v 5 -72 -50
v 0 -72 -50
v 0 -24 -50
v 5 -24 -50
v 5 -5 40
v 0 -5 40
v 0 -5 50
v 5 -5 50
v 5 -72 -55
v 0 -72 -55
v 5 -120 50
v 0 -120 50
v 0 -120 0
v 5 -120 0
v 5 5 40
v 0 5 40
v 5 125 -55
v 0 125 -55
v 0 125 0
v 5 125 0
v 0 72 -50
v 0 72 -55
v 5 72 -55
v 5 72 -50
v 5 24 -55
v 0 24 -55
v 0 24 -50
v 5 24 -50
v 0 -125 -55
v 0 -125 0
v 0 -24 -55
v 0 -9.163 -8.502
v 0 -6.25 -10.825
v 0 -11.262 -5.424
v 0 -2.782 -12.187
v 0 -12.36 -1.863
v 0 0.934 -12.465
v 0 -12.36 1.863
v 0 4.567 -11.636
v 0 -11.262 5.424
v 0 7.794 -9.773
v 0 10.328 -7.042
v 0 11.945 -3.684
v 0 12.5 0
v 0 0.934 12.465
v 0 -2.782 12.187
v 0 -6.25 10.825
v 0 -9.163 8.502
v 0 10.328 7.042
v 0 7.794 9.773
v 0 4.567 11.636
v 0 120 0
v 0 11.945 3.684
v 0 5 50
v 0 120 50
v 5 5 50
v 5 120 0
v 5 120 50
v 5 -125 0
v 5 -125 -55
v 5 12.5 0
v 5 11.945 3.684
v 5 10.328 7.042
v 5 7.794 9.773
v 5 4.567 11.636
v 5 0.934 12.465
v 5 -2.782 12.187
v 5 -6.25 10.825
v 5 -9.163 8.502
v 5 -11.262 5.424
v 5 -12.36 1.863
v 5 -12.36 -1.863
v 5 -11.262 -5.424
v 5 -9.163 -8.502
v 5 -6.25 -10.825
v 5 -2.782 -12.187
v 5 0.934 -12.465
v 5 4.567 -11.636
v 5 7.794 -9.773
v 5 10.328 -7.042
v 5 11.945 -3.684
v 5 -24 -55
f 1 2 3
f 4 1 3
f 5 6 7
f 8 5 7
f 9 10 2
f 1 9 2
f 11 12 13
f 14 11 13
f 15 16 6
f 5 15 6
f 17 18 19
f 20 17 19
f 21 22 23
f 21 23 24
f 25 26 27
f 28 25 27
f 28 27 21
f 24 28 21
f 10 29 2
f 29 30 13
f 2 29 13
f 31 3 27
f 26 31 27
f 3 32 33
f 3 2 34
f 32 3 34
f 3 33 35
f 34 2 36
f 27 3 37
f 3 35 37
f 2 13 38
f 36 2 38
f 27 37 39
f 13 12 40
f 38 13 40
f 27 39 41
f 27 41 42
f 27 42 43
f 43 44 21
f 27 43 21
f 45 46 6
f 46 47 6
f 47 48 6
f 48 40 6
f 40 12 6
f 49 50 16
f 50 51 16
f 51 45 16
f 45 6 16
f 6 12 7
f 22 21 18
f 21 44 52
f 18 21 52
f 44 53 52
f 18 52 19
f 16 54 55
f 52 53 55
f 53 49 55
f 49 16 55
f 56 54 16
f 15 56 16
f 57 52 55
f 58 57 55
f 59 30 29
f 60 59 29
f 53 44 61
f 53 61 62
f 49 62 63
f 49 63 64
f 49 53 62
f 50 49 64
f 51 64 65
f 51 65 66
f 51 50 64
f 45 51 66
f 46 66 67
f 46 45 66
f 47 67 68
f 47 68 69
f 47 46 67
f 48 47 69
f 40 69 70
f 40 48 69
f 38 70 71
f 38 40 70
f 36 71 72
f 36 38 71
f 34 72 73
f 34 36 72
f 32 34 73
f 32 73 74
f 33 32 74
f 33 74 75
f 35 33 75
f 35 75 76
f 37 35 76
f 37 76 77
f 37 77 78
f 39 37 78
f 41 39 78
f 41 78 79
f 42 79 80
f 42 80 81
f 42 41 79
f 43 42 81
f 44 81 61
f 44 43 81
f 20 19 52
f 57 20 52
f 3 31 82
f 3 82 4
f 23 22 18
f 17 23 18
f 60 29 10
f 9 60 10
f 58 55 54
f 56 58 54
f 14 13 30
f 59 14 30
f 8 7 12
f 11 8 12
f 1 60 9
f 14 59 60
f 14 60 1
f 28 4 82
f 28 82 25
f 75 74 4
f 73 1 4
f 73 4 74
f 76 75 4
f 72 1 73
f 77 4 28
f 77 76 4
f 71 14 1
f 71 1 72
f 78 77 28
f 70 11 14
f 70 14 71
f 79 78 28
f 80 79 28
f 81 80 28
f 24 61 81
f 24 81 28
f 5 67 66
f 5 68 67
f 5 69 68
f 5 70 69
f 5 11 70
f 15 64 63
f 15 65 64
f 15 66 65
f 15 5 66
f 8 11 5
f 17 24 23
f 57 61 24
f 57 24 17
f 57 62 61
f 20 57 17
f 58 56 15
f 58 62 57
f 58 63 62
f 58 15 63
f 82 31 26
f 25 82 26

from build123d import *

# Parameters (mm, degrees)
F0_W     = 53
F0_H     = 5
F0_R     = 12.5
F0_W_2   = 48
F1_DEPTH = 5


with BuildPart() as f1:
    # F0 (on Right) → F1 (new body)
    with BuildSketch(Plane.YZ):
        with Locations((98.5, -52.5)):
            Rectangle(F0_W, F0_H)
        Polygon((72, -50), (125, -50), (125, 0), (120, 0), (120, 50), (5, 50), (5, 40), (0, 40), (-5, 40), (-5, 50), (-120, 50), (-120, 0), (-125, 0), (-125, -50), (-72, -50), (-24, -50), (24, -50), align=None)
        Circle(F0_R, mode=Mode.SUBTRACT)
        with Locations((0, -52.5)):
            Rectangle(F0_W_2, F0_H)
        with Locations((-98.5, -52.5)):
            Rectangle(F0_W, F0_H)
    extrude(amount=F1_DEPTH)


solid = f1.part
